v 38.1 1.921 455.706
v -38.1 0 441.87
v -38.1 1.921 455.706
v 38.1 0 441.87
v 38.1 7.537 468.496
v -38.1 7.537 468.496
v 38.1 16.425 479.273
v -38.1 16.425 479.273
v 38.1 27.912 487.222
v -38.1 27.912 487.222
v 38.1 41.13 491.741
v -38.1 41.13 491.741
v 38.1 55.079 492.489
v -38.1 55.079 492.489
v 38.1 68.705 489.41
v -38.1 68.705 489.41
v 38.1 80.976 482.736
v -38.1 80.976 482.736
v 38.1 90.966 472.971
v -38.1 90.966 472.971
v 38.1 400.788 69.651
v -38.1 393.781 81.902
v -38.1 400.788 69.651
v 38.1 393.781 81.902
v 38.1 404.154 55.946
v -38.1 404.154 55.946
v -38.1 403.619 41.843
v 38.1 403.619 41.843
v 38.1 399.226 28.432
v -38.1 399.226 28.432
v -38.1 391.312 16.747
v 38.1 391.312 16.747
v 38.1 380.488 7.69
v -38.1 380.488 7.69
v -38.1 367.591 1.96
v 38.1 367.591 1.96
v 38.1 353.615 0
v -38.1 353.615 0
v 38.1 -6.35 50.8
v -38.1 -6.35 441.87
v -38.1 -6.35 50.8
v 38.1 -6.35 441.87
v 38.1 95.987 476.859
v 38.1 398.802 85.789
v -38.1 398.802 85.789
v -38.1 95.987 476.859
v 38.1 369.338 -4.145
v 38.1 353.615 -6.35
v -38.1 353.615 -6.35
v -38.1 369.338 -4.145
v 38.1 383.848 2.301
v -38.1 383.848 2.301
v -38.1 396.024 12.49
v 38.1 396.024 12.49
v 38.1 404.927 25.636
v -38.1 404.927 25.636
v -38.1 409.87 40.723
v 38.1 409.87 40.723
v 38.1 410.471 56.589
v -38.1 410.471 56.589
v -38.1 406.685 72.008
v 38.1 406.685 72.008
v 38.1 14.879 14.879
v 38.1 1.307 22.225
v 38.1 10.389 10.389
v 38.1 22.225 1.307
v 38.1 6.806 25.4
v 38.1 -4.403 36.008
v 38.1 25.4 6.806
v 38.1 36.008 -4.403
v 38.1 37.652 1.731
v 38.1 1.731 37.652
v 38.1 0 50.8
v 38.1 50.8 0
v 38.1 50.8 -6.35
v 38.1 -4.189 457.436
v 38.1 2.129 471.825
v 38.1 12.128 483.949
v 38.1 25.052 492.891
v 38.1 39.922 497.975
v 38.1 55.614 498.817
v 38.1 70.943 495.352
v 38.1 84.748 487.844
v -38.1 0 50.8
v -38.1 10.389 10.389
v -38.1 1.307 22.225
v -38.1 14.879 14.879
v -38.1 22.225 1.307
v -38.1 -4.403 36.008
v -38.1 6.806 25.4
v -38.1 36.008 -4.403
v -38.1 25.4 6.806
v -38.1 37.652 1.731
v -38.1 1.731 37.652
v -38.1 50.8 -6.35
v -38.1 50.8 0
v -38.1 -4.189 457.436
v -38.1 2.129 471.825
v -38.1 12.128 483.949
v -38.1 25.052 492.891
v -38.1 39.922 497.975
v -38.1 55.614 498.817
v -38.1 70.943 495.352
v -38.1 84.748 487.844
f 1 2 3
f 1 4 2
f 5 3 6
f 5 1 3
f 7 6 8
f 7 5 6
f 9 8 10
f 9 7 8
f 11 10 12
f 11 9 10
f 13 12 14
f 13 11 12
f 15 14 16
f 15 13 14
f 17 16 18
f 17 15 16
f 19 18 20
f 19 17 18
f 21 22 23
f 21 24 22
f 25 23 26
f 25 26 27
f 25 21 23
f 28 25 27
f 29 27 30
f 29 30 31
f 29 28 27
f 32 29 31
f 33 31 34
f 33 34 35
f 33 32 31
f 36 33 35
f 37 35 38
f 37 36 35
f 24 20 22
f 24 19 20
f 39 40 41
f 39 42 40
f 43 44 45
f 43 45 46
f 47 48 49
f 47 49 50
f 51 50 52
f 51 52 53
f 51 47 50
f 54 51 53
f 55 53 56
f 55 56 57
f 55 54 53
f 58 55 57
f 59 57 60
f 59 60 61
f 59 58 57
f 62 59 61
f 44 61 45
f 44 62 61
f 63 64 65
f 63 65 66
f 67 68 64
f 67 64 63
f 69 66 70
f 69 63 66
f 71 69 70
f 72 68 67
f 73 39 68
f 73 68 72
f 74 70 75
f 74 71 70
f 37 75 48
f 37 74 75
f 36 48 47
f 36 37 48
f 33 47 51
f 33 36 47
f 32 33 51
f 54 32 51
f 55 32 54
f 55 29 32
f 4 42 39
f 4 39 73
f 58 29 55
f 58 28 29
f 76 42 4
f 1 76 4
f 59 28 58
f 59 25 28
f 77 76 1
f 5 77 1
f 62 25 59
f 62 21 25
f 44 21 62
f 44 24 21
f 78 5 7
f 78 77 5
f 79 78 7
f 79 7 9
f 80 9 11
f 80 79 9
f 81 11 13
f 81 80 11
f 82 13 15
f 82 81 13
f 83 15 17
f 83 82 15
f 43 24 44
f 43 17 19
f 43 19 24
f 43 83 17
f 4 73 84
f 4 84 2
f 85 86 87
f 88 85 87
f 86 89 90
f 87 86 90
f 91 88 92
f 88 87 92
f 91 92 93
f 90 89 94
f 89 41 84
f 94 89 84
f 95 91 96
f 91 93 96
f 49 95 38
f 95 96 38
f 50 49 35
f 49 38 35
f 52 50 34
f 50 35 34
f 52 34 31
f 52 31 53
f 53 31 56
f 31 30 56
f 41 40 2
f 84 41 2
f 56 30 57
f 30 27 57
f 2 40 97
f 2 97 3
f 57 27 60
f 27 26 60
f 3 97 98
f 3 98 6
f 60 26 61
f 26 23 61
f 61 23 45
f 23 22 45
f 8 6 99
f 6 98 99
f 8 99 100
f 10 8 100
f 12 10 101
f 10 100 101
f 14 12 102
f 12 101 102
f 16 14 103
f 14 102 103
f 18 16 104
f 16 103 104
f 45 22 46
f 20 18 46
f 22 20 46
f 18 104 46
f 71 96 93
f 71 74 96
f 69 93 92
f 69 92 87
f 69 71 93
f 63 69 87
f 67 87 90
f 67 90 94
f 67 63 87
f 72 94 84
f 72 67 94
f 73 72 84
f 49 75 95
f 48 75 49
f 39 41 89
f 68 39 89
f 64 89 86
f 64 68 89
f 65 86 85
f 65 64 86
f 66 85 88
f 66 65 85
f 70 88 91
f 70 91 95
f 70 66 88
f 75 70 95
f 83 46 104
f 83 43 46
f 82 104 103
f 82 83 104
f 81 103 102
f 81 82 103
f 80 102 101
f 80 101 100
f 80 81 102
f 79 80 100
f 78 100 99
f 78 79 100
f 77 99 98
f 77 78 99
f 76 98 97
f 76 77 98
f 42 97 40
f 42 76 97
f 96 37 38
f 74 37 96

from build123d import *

# Parameters (mm, degrees)
F1_DEPTH = 38.1


with BuildPart() as f1:
    # F0 (on Right) → F1 (new body, symmetric)
    with BuildSketch(Plane.YZ):
        with BuildLine():
            ThreePointArc((-6.350009, 50.8), (10.388841, 10.388841), (50.8, -6.350009))
            Line((50.8, -6.350009), (353.615227, -6.350009))
            ThreePointArc((353.615227, -6.350009), (404.926872, 25.635765), (398.802211, 85.789428))
            Line((398.802211, 85.789428), (95.986983, 476.859172))
            ThreePointArc((95.986983, 476.859172), (32.310989, 495.946356), (-6.350009, 441.869744))
            Line((-6.350009, 441.869744), (-6.350009, 50.8))
        make_face()
        with BuildLine():
            Line((0, 50.8), (0, 441.869744))
            ThreePointArc((0, 441.869744), (34.365327, 489.937836), (90.966201, 472.971453))
            Line((90.966201, 472.971453), (393.781428, 81.901709))
            ThreePointArc((393.781428, 81.901709), (399.22557, 28.431795), (353.615227, 0))
            Line((353.615227, 0), (50.8, 0))
            ThreePointArc((50.8, 0), (14.878976, 14.878976), (0, 50.8))
        make_face(mode=Mode.SUBTRACT)
    extrude(amount=F1_DEPTH, both=True)


solid = f1.part
